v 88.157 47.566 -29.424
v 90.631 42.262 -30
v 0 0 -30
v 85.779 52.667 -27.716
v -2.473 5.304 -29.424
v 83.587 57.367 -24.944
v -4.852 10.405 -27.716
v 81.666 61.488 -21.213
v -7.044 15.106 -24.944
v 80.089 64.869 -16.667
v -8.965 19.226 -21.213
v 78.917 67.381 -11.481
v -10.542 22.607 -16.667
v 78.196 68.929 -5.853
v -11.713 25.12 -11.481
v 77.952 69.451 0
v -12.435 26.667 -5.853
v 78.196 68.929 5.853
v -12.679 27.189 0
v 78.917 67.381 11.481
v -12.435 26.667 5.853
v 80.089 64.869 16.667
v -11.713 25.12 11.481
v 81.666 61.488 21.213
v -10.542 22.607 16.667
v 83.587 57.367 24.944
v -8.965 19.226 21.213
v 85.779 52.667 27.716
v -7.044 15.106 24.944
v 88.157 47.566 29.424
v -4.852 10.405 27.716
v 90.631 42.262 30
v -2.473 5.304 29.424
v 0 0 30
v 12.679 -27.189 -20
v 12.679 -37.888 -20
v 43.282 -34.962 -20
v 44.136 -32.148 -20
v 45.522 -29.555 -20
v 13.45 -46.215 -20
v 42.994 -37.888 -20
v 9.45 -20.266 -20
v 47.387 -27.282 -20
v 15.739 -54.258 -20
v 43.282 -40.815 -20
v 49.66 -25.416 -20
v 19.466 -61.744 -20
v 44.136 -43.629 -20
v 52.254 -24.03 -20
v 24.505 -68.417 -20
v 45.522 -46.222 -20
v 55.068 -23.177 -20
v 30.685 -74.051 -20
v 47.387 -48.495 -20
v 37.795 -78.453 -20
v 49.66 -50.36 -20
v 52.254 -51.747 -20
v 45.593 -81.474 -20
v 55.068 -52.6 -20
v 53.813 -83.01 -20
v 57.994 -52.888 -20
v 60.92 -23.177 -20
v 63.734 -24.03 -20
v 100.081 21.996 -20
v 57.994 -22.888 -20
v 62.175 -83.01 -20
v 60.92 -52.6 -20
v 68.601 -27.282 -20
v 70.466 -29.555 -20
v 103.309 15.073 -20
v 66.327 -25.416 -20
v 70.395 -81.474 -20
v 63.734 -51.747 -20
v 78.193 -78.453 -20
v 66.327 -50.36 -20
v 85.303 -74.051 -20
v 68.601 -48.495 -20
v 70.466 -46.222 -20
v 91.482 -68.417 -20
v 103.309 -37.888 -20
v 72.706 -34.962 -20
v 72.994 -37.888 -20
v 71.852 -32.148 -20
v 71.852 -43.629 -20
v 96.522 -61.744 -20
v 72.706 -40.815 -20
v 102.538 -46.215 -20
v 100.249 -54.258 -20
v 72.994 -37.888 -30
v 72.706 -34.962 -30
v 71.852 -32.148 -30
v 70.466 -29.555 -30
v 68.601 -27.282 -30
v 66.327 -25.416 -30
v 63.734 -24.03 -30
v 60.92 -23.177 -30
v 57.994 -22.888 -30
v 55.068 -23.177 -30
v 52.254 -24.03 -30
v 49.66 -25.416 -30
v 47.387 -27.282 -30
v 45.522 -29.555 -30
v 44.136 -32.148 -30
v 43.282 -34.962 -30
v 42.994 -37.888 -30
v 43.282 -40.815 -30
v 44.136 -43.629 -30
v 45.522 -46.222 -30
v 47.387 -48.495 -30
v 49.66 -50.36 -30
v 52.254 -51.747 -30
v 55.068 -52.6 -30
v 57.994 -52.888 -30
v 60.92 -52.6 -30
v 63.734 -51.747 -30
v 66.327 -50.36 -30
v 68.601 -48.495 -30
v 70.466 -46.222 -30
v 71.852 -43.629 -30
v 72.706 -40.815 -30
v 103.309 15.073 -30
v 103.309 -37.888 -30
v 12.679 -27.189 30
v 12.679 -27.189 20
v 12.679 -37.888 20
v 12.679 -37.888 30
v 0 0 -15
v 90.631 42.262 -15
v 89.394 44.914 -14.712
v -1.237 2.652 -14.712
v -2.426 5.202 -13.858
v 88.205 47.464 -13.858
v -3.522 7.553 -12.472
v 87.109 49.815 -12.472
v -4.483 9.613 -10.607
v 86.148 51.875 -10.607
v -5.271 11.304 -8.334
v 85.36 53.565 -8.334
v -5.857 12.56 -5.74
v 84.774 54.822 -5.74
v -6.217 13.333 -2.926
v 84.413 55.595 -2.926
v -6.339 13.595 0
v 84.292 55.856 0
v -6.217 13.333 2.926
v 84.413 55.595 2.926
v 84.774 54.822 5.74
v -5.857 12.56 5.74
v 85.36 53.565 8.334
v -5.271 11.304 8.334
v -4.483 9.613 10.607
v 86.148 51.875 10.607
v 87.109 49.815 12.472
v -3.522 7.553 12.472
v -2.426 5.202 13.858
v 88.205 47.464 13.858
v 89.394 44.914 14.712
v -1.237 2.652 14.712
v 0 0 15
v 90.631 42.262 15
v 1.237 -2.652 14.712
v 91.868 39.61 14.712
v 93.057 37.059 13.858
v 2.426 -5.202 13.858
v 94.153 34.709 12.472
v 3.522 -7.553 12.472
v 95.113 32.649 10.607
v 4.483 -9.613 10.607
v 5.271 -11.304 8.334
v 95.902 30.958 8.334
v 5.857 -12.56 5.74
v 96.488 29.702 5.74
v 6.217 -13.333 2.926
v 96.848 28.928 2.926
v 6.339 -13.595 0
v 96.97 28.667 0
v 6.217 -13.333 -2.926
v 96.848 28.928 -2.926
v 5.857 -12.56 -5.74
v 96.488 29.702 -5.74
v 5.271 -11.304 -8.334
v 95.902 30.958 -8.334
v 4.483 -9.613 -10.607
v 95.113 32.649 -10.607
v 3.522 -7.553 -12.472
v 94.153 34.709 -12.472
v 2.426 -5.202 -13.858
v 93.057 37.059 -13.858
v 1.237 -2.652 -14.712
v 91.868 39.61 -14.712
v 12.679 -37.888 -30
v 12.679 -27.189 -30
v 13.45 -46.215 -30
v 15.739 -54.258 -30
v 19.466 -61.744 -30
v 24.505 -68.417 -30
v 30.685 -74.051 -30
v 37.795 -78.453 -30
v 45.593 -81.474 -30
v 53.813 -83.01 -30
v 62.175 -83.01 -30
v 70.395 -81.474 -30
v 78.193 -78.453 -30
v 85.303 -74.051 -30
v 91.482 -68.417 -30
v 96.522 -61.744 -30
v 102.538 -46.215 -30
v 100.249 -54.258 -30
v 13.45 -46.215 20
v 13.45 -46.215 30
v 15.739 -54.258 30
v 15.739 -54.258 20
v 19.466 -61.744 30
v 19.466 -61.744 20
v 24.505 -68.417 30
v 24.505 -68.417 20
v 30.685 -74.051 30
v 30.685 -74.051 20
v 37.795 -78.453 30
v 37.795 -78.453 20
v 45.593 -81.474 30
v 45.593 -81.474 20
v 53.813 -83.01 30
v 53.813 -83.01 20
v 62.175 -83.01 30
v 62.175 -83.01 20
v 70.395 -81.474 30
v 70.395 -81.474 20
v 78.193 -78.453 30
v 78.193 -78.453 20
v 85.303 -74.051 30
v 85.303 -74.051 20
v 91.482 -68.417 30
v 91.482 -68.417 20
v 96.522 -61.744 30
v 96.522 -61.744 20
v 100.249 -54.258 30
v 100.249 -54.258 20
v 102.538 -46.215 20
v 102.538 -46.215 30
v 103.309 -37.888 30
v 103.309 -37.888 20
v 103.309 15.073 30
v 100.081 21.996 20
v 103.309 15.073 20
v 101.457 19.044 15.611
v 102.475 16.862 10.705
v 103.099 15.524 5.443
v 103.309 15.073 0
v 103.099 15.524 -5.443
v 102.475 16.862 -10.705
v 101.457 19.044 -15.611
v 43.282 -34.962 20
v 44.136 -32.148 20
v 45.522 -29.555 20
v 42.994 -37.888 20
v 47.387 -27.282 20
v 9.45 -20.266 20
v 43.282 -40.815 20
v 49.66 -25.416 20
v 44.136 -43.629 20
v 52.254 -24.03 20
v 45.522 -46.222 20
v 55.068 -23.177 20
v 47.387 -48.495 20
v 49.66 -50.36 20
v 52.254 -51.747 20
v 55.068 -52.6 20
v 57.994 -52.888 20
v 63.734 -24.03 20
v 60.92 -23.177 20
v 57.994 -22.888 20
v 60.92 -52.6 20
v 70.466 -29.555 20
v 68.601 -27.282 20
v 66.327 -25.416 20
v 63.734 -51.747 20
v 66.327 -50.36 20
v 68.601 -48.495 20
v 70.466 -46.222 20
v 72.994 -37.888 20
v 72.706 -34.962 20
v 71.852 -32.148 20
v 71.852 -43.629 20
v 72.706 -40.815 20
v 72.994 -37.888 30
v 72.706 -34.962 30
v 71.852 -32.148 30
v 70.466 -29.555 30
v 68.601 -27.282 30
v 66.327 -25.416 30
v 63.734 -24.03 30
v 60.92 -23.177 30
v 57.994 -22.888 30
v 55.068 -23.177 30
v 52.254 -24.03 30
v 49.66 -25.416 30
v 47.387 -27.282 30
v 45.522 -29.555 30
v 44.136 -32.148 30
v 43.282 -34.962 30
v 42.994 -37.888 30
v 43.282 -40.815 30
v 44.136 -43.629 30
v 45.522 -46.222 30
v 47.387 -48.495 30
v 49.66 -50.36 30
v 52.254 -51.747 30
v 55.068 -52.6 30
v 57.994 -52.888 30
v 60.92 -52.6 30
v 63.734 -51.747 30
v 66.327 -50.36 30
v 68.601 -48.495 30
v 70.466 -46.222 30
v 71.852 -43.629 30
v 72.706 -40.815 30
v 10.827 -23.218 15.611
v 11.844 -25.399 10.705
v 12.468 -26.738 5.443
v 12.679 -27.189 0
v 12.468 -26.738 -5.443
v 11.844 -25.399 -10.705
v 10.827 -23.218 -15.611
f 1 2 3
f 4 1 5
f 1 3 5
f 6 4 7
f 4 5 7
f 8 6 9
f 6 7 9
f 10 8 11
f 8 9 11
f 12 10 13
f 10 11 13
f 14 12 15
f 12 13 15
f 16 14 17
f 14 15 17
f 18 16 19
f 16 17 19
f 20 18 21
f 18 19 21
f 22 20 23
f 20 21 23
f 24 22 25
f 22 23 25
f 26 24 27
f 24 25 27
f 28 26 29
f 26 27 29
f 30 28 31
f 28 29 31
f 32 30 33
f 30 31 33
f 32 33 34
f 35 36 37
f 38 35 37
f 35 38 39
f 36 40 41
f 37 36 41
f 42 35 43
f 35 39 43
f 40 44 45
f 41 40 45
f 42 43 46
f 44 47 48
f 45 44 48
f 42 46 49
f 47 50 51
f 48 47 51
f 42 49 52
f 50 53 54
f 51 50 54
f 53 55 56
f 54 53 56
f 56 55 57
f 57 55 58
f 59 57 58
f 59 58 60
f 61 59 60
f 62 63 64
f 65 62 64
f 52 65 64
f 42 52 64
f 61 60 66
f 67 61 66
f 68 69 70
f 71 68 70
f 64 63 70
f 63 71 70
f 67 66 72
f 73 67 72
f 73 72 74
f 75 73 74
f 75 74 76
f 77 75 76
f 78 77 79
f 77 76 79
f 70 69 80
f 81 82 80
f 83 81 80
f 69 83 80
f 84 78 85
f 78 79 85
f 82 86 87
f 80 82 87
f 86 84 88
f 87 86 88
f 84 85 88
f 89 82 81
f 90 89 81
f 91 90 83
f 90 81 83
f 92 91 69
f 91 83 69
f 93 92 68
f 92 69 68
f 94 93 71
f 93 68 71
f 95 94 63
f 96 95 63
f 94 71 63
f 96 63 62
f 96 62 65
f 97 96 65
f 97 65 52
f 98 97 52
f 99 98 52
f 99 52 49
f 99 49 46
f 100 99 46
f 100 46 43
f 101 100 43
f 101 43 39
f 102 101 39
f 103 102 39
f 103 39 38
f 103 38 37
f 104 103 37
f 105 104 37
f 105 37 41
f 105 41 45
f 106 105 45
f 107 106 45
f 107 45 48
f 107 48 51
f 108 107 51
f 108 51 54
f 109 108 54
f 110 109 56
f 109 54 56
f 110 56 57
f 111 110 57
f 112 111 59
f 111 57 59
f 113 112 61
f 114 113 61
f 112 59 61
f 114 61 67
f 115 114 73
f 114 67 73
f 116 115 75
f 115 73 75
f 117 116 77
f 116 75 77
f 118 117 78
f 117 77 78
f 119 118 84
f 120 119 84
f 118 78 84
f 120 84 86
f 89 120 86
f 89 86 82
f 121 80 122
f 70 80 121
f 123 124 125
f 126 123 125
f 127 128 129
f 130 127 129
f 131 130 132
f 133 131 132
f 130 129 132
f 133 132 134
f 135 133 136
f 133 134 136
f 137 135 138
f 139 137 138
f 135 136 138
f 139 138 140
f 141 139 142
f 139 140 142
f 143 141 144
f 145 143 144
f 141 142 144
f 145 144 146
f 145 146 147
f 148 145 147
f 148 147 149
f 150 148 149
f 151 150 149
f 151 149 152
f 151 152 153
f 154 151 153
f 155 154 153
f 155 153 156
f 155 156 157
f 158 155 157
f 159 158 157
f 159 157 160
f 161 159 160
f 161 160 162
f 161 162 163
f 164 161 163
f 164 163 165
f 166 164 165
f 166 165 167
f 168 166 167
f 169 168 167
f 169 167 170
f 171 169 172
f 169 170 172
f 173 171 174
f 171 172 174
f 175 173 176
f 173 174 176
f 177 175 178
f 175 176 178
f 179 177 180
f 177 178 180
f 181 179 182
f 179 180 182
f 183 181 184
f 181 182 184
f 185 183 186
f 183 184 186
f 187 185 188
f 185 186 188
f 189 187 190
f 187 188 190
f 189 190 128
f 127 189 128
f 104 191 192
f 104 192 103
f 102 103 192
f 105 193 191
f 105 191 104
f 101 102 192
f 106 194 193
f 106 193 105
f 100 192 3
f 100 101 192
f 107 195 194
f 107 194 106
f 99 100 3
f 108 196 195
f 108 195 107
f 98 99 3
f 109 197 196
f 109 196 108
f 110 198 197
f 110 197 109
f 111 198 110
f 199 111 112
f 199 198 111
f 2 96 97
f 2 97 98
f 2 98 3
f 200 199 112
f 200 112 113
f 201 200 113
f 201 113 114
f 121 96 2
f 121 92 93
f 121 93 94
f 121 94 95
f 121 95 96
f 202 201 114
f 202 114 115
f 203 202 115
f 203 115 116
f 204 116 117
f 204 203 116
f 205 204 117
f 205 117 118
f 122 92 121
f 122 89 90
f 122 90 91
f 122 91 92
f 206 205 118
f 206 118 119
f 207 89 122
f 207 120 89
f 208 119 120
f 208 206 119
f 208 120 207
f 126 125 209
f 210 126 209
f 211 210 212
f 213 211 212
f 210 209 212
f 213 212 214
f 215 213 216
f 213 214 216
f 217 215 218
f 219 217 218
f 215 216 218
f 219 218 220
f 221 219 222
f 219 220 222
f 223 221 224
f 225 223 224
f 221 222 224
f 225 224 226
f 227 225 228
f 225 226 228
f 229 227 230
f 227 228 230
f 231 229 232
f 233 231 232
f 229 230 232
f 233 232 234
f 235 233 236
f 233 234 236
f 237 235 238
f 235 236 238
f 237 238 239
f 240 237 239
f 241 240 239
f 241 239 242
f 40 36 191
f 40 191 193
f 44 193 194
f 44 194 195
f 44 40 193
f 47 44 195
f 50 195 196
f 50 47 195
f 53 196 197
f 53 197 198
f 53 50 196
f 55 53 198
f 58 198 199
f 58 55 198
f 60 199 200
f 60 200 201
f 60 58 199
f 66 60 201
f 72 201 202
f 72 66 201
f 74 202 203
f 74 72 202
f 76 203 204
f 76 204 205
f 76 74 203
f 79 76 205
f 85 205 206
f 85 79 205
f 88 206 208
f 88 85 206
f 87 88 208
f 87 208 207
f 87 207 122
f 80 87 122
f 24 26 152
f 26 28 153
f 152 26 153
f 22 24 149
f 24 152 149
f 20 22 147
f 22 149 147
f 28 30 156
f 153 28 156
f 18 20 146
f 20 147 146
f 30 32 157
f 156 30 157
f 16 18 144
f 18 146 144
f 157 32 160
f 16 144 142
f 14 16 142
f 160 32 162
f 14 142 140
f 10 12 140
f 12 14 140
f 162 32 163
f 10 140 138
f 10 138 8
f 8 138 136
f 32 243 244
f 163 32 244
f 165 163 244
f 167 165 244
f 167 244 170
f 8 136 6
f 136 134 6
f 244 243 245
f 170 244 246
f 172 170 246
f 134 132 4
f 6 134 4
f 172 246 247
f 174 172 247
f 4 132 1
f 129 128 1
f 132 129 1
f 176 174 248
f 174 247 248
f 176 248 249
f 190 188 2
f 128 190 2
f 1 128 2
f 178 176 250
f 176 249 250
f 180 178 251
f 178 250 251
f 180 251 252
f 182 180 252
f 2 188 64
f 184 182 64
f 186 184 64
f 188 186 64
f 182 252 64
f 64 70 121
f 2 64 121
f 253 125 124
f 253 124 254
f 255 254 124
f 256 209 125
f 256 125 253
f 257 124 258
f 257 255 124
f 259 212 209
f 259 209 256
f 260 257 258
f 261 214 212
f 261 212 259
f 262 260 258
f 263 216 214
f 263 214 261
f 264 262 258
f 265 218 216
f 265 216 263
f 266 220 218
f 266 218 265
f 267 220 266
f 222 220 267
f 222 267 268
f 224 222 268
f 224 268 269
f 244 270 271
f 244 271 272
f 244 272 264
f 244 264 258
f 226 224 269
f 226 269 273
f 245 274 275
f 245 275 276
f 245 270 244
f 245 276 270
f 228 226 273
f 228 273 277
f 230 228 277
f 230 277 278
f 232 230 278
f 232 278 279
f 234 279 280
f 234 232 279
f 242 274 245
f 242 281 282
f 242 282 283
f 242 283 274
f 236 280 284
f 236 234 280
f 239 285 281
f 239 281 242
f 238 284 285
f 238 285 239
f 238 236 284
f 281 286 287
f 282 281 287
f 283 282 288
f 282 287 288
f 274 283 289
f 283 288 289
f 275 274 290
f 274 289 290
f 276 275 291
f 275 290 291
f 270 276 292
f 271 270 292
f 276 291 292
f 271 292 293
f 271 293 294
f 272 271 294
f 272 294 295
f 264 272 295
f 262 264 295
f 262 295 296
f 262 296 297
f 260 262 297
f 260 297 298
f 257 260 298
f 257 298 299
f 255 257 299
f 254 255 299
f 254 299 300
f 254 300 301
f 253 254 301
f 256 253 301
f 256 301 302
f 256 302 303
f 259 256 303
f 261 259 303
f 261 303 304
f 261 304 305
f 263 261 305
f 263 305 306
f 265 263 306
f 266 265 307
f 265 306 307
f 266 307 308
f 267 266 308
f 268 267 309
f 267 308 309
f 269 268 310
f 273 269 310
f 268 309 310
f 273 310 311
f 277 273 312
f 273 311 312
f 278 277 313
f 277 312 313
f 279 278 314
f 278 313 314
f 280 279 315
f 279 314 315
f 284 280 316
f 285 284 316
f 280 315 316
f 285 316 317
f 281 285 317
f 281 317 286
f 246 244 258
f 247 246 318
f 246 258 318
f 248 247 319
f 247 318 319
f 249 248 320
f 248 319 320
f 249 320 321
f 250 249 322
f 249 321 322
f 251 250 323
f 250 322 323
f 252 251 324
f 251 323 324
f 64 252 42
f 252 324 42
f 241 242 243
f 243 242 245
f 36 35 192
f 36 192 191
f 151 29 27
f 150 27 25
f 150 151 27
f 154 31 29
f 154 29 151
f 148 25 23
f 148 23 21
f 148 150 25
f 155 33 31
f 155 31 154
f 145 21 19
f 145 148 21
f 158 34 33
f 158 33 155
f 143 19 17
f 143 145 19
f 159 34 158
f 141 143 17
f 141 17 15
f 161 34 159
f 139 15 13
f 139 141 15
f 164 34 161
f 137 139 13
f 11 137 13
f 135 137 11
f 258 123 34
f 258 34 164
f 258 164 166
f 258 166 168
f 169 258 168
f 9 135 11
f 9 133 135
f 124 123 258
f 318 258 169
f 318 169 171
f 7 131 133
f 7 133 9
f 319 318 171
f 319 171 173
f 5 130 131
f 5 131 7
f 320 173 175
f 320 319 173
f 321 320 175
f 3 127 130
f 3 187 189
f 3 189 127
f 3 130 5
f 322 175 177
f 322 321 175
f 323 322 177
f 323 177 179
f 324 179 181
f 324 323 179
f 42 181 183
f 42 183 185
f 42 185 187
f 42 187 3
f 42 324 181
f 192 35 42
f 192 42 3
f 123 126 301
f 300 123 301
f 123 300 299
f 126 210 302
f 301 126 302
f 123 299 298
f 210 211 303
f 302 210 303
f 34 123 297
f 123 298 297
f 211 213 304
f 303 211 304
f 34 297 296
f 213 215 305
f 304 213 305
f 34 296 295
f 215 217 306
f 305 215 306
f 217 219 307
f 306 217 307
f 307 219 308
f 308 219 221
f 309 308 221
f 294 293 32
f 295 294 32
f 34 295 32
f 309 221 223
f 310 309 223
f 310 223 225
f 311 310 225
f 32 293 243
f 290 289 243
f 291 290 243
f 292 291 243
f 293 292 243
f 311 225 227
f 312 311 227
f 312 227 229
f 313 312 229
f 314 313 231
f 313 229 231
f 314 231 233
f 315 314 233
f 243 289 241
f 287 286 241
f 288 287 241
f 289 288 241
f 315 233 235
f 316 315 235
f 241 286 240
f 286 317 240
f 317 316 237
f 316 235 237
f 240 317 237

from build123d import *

# Parameters (mm, degrees)
BOSS_EXTRUDE1_START     = 20
BOSS_EXTRUDE1_DEPTH     = 10
BOSS_EXTRUDE2_START     = -20
BOSS_EXTRUDE2_DEPTH     = 10
SKETCH3_W               = 100
SKETCH3_H               = 10
BOSS_EXTRUDE3_DEPTH     = 30
SKETCH4_R               = 15
CUT_EXTRUDE1_DEPTH      = 23.981333294
CUT_EXTRUDE1_DEPTH_BACK = 147.654073313
SKETCH5_R               = 15
CUT_EXTRUDE2_DEPTH      = 1
CUT_EXTRUDE2_DEPTH_BACK = 61


with BuildPart() as part:
    # Sketch1 → Revolve1 (revolve)
    with BuildSketch(Plane.XY):
        Polygon((0, 0), (90.630778704, 42.261826174), (77.952230851, 69.451059785), (-12.678547852, 27.189233611), align=None)
    revolve(axis=Axis((0, 0, 0), (0.906307787, 0.422618262, 0)))



with BuildPart() as body_2:
    # Sketch2 → Boss-Extrude1 (new body)
    with BuildSketch(Plane.XY.offset(BOSS_EXTRUDE1_START)):
        with BuildLine():
            Line((12.678547852, -27.189233611), (12.678547852, -37.88831917))
            ThreePointArc((12.678547852, -37.88831917), (57.993937204, -83.203708522), (103.309326556, -37.88831917))
            Line((103.309326556, -37.88831917), (103.309326556, 15.072592563))
            Line((103.309326556, 15.072592563), (12.678547852, -27.189233611))
        make_face()
    extrude(amount=BOSS_EXTRUDE1_DEPTH)


with BuildPart() as body_3:
    # Sketch2<3> → Boss-Extrude2 (new body)
    with BuildSketch(Plane.XY.offset(BOSS_EXTRUDE2_START)):
        with BuildLine():
            Line((12.678547852, -27.189233611), (12.678547852, -37.88831917))
            ThreePointArc((12.678547852, -37.88831917), (57.993937204, -83.203708522), (103.309326556, -37.88831917))
            Line((103.309326556, -37.88831917), (103.309326556, 15.072592563))
            Line((103.309326556, 15.072592563), (12.678547852, -27.189233611))
        make_face()
    extrude(amount=-BOSS_EXTRUDE2_DEPTH)


with BuildPart() as part_1:
    add(part.part)

    add(body_2.part)  # Boss-Extrude3 merges body 2

    add(body_3.part)  # Boss-Extrude3 merges body 3
    # Sketch3 → Boss-Extrude3 (add)
    with BuildSketch(Plane(origin=(12.678547852, -27.189233611, 0), x_dir=(0.906307787, 0.422618262, 0), z_dir=(-0.422618262, 0.906307787, 0))):
        with Locations((50, -25)):
            Rectangle(SKETCH3_W, SKETCH3_H)
        with Locations((50, 25)):
            Rectangle(SKETCH3_W, SKETCH3_H)
    extrude(amount=BOSS_EXTRUDE3_DEPTH)

    # Sketch4 → Cut-Extrude1 (cut, two sides)
    with BuildSketch(Plane(origin=(90.630778704, 42.261826174, 0), x_dir=(0, 0, -1), z_dir=(0.906307787, 0.422618262, 0))) as cut_extrude1_sk:
        Circle(SKETCH4_R)
    extrude(amount=CUT_EXTRUDE1_DEPTH, mode=Mode.SUBTRACT)
    extrude(cut_extrude1_sk.sketch, amount=-CUT_EXTRUDE1_DEPTH_BACK, mode=Mode.SUBTRACT)

    # Sketch5 → Cut-Extrude2 (cut, two sides)
    with BuildSketch(Plane.XY.offset(30)) as cut_extrude2_sk:
        with Locations((57.993937204, -37.88831917)):
            Circle(SKETCH5_R)
    extrude(amount=CUT_EXTRUDE2_DEPTH, mode=Mode.SUBTRACT)
    extrude(cut_extrude2_sk.sketch, amount=-CUT_EXTRUDE2_DEPTH_BACK, mode=Mode.SUBTRACT)


solid = part_1.part
